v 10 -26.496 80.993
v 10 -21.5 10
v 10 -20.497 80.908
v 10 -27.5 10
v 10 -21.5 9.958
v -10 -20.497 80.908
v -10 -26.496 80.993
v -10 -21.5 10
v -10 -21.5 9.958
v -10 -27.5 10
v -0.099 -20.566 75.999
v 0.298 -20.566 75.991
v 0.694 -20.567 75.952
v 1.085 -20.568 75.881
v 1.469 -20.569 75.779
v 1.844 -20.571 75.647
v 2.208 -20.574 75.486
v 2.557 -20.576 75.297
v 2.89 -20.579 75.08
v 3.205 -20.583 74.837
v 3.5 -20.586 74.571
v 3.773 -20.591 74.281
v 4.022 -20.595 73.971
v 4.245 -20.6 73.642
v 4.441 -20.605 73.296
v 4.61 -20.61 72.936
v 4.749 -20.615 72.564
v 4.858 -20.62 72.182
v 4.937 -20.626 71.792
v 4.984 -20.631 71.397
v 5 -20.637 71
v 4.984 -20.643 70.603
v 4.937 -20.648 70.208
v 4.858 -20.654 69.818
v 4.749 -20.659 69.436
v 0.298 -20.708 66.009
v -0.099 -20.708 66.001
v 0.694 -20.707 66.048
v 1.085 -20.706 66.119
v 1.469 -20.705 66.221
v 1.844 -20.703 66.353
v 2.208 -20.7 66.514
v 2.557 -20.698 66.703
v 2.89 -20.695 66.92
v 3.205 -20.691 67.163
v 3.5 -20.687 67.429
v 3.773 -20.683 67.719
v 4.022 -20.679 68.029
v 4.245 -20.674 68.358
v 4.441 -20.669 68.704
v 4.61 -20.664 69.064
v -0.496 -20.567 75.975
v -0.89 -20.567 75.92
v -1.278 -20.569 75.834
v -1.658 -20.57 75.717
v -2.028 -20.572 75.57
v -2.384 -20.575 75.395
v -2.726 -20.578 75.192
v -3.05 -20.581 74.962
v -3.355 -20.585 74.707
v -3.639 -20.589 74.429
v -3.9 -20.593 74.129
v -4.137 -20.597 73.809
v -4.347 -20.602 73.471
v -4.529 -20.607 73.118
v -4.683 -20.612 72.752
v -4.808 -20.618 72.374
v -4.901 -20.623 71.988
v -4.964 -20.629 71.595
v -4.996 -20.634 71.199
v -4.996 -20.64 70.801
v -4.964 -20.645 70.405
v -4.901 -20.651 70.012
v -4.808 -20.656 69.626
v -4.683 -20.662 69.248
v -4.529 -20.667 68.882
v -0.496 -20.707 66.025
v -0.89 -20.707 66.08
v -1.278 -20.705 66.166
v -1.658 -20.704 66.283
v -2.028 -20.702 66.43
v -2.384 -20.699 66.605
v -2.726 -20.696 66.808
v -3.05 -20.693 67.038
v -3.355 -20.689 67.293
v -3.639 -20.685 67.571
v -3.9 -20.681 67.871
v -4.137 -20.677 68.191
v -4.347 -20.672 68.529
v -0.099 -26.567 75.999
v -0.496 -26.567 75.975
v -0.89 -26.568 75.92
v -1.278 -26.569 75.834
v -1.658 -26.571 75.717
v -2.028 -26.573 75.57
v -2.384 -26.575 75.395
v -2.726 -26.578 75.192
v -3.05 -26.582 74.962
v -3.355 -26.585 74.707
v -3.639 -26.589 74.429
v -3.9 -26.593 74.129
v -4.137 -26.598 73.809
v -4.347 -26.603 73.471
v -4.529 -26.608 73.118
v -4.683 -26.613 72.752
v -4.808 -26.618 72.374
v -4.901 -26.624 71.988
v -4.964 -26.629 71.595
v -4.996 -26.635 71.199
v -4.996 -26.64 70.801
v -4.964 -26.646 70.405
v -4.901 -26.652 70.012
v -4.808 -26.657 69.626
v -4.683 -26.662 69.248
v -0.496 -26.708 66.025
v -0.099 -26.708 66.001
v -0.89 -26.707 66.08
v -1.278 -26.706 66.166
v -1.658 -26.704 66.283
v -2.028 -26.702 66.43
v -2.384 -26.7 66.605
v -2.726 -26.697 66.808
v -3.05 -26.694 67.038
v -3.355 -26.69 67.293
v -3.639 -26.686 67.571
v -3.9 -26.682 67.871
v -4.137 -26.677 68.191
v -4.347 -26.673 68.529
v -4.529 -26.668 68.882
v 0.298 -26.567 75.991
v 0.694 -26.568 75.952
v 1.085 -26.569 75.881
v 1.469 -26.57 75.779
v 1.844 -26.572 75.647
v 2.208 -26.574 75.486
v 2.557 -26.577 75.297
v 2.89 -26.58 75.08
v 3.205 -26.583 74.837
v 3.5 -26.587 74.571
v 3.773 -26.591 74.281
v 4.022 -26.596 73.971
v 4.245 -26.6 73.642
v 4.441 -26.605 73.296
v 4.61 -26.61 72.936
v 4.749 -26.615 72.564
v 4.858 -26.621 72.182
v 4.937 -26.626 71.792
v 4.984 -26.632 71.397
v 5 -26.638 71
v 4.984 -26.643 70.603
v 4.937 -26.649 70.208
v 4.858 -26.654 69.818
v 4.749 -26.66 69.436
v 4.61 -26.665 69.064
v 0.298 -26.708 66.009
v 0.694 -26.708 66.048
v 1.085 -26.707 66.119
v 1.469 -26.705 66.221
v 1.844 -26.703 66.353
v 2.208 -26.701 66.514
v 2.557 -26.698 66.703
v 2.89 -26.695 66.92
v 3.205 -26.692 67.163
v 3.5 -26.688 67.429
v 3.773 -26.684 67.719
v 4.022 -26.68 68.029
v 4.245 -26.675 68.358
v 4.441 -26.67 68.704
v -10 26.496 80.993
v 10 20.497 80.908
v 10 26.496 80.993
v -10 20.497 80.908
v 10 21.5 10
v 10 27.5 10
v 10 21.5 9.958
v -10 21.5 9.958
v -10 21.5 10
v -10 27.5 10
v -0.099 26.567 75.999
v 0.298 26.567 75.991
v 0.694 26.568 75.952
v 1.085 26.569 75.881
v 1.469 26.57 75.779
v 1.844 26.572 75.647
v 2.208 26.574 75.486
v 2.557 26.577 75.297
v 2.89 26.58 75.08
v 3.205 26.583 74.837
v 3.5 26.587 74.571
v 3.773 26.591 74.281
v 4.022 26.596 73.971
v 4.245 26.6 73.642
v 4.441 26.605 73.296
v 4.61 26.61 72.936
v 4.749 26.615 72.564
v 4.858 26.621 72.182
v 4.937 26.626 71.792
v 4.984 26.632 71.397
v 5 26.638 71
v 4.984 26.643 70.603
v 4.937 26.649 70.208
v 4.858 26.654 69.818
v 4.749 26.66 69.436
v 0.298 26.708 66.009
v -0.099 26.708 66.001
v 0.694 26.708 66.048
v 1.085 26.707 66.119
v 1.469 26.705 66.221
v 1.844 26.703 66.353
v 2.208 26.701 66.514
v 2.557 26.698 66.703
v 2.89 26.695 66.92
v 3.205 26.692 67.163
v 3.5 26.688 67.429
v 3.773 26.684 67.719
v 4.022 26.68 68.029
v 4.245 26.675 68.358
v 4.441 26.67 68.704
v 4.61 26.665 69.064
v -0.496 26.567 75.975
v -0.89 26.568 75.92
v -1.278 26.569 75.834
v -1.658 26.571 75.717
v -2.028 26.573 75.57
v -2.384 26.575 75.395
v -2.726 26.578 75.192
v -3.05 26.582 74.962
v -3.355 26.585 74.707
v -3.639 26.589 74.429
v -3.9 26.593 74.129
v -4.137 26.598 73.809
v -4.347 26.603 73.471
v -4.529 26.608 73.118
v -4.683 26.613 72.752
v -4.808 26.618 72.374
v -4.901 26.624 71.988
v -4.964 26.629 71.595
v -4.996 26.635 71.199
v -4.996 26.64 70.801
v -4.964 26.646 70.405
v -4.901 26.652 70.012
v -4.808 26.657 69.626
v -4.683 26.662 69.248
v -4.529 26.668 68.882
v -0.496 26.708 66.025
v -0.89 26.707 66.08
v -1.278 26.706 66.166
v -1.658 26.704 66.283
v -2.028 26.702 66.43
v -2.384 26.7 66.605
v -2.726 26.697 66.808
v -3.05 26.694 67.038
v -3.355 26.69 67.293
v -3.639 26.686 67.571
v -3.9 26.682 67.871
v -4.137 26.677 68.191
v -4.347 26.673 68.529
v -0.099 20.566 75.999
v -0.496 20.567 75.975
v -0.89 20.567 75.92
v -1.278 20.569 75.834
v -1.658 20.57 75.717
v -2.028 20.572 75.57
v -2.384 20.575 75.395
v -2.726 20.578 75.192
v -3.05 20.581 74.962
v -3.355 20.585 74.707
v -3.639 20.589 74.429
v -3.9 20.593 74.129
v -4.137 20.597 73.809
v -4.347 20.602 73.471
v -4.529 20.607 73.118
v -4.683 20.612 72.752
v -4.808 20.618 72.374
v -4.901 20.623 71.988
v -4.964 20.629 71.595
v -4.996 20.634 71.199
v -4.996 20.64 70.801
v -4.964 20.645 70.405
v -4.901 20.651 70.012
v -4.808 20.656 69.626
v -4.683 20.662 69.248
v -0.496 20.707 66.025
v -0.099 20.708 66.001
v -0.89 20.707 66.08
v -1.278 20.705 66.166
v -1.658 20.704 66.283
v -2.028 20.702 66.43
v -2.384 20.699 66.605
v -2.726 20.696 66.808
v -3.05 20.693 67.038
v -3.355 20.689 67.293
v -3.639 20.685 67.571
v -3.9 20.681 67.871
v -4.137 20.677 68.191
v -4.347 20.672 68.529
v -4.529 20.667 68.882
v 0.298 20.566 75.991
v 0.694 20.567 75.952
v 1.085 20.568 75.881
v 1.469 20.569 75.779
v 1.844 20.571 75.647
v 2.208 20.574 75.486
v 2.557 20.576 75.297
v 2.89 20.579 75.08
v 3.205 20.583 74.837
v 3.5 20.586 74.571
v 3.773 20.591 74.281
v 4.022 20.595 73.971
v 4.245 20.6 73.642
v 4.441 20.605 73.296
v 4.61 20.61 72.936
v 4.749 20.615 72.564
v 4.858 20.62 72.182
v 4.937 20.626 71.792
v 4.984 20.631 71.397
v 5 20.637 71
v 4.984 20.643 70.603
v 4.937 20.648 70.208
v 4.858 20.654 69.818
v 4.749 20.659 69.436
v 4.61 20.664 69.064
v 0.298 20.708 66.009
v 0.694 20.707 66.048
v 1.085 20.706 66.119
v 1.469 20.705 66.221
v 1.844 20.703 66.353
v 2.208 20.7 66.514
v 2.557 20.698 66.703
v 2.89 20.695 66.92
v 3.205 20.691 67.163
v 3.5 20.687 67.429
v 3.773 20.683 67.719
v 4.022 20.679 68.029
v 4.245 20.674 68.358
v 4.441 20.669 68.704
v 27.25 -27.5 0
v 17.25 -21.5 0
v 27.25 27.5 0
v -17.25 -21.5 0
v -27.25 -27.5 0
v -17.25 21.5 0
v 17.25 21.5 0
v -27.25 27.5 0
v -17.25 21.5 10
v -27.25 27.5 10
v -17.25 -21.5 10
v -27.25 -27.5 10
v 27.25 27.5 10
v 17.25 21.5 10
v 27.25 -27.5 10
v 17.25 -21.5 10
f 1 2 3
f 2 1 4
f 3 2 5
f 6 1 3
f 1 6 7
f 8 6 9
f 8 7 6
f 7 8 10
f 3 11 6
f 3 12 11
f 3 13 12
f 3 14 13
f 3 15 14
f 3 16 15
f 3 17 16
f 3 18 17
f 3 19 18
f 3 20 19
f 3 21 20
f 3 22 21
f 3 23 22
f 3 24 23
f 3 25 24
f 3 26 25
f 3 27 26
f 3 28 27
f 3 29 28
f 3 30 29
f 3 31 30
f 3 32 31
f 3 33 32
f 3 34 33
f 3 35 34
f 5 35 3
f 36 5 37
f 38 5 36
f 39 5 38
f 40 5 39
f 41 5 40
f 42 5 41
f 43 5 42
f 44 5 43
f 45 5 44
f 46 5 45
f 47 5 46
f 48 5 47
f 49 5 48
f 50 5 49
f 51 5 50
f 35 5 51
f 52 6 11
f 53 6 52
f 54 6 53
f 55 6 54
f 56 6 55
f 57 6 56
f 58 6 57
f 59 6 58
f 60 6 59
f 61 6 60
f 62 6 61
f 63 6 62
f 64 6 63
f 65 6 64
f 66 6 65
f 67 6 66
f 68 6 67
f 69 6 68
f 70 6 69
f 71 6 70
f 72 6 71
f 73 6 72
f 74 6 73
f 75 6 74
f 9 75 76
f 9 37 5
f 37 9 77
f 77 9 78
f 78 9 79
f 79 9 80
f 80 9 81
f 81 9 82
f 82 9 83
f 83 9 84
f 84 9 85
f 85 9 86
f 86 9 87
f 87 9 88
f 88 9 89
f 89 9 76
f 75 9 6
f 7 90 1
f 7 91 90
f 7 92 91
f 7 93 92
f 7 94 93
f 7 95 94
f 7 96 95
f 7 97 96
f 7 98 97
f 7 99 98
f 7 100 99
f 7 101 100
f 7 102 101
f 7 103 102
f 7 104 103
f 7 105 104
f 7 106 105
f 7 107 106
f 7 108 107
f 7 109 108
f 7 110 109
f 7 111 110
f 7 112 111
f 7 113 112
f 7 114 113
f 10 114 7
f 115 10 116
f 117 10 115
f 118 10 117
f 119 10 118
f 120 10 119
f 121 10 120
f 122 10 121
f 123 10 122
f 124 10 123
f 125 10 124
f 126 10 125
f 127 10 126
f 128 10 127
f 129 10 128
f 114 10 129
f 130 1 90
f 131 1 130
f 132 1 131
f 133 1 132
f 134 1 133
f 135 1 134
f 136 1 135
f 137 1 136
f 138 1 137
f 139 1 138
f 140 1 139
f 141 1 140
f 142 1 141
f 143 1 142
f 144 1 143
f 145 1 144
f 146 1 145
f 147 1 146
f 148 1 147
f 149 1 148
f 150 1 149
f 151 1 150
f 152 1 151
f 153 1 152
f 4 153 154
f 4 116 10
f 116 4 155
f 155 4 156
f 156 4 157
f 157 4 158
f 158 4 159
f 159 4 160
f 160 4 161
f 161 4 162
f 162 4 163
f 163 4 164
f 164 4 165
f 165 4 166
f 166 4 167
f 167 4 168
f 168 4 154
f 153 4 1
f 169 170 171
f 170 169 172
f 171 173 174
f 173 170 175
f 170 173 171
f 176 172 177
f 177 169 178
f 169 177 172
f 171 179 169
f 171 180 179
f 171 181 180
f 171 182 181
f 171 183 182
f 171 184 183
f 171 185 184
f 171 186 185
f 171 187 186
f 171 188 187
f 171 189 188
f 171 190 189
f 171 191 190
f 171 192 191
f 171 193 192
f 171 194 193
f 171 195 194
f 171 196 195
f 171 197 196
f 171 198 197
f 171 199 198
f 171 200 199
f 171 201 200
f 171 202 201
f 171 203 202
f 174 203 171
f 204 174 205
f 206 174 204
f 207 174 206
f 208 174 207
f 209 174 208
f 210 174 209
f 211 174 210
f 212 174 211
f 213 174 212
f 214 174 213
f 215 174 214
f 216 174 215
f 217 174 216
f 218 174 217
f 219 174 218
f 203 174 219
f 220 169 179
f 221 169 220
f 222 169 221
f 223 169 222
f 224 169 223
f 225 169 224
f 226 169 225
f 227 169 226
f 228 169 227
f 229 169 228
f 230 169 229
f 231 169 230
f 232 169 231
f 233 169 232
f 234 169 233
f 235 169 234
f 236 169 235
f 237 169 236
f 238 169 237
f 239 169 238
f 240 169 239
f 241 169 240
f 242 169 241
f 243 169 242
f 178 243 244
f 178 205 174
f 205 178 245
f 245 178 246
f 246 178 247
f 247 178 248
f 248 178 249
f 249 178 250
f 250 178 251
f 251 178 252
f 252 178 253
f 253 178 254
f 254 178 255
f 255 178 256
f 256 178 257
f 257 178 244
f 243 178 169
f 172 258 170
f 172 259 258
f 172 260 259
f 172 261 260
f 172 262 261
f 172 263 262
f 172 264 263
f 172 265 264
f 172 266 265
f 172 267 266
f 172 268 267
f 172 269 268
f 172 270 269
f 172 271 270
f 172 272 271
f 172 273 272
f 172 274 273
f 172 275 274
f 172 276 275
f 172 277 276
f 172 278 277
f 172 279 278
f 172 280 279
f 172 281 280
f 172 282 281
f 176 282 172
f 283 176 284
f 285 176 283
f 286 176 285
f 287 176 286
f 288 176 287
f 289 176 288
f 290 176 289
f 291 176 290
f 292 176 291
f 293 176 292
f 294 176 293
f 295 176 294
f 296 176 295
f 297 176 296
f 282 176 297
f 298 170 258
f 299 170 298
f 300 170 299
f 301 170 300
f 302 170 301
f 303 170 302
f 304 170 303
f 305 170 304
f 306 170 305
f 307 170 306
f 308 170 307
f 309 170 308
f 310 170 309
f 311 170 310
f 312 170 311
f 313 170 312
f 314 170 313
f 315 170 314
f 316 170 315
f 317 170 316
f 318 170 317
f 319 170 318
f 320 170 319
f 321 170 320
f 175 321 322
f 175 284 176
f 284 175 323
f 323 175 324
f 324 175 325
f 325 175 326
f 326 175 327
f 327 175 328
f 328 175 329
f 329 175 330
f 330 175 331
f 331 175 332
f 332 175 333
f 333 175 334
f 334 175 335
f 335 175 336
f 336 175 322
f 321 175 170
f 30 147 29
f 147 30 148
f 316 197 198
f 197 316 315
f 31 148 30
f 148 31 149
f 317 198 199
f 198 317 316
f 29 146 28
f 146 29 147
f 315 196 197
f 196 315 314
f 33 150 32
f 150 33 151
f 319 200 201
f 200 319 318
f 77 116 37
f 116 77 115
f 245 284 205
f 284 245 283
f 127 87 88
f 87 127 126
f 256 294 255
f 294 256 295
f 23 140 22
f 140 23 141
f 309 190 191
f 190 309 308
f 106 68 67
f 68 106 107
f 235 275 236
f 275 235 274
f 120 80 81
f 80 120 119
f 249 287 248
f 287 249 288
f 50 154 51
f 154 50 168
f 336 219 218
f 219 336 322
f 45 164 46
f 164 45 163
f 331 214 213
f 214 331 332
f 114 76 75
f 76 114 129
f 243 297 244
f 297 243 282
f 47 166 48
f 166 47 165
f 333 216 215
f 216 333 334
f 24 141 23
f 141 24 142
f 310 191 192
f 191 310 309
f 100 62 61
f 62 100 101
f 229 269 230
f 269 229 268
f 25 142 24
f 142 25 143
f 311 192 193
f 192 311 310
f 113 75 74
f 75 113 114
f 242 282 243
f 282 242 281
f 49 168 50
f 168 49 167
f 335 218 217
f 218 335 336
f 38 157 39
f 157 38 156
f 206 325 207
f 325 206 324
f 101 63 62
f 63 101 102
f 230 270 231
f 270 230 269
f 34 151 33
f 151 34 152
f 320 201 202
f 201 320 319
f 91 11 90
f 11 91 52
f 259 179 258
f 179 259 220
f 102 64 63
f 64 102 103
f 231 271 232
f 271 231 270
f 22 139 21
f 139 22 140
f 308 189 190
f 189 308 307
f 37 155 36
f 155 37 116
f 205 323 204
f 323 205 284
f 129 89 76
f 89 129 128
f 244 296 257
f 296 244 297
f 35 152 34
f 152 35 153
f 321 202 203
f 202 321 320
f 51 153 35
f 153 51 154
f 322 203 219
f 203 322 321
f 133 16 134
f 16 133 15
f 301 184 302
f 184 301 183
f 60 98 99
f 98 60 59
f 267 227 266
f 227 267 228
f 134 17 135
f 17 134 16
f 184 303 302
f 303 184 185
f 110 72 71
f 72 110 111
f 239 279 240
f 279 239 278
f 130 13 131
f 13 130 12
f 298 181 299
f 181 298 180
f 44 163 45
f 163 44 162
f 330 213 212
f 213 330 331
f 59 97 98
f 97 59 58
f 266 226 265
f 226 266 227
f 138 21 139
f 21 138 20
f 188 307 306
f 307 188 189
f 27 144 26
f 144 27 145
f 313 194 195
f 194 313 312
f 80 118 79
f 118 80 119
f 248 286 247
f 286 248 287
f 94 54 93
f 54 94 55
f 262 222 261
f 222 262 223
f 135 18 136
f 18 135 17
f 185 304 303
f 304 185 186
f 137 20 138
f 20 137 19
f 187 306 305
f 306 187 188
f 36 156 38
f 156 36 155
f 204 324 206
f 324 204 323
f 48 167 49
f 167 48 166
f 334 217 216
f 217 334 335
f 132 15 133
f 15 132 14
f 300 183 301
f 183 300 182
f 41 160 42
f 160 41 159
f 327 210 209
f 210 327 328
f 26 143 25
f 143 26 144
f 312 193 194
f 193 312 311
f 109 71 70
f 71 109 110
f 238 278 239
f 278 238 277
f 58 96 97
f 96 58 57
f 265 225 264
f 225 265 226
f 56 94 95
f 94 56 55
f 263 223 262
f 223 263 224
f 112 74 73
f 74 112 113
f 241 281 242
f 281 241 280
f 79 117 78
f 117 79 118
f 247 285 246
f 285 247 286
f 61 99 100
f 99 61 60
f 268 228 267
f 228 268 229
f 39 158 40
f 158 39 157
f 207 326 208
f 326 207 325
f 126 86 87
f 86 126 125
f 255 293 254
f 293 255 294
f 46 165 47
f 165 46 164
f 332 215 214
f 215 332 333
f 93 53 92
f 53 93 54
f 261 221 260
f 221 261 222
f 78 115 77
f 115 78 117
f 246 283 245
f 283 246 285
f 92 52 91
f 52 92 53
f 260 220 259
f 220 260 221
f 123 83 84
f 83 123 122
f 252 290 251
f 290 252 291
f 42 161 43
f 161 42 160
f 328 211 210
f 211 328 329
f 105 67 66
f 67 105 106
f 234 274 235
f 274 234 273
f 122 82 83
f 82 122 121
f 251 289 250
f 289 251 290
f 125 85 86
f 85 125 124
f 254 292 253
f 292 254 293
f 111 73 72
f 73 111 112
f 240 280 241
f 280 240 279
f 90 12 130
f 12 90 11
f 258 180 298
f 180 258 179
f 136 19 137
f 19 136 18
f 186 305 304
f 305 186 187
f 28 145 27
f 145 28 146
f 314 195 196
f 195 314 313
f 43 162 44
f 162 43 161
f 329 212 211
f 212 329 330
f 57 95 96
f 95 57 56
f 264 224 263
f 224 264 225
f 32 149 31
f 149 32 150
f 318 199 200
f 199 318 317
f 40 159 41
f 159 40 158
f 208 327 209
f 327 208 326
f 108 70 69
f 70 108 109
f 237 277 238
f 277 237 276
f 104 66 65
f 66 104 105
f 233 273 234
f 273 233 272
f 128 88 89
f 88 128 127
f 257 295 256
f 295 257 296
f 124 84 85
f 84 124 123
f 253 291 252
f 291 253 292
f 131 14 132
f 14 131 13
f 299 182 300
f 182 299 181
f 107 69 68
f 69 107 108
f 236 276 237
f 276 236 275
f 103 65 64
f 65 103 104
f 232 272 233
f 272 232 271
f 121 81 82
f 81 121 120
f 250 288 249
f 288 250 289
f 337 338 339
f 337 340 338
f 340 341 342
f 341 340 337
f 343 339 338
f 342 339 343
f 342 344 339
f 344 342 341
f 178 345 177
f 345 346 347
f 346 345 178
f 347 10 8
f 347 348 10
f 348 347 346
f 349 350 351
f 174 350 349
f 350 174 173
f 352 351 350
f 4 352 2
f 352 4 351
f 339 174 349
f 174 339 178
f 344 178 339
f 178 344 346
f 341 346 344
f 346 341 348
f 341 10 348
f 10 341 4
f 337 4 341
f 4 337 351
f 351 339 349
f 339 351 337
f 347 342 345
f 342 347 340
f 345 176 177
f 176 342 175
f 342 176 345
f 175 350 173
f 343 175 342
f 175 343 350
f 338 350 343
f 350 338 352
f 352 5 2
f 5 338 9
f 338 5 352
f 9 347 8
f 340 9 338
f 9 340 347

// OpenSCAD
/*
 * Ferris wheel base
 * By smkent (GitHub) / bulbasaur0 (Printables)
 *
 * Licensed under Creative Commons (4.0 International License) Attribution-ShareAlike
 */

module __end_customizer_options__() { }

// Constants //

$fa = $preview ? $fa : 2;
$fs = $preview ? $fs / 4 : 0.4;

base_outer = [10 * 2 + 34.5, 55];
base_inner = [34.5, 55 - 6 * 2];
base_height = 10;

supports_size = [20, 6, 61 + 10];
supports_tilt = 0.81;
supports_placement = 10;

axle_height = 10 + 61;
axle_diameter = 10;

// Modules //

module ferris_wheel_base() {
    linear_extrude(height=base_height)
    difference() {
        square(base_outer, center=true);
        square(base_inner, center=true);
    }
}

module ferris_wheel_supports() {
    for (mirror_y = [0, 1])
    mirror([0, mirror_y])
    translate([-supports_size[0] / 2, -base_outer[1] / 2, supports_placement])
    rotate([-supports_tilt, 0, 0])
    cube(supports_size);
}

module ferris_wheel_axle() {
    difference() {
        children();
        translate([0, 0, axle_height])
        rotate([90, 0, 0])
        cylinder(h=base_outer[1] * 2, d=axle_diameter, center=true);
    }
}

module ferris_wheel_stand() {
    ferris_wheel_base();
    ferris_wheel_axle() {
        ferris_wheel_supports();
    }
}

module main() {
    color("gold", 0.9)
    ferris_wheel_stand();
}

main();
